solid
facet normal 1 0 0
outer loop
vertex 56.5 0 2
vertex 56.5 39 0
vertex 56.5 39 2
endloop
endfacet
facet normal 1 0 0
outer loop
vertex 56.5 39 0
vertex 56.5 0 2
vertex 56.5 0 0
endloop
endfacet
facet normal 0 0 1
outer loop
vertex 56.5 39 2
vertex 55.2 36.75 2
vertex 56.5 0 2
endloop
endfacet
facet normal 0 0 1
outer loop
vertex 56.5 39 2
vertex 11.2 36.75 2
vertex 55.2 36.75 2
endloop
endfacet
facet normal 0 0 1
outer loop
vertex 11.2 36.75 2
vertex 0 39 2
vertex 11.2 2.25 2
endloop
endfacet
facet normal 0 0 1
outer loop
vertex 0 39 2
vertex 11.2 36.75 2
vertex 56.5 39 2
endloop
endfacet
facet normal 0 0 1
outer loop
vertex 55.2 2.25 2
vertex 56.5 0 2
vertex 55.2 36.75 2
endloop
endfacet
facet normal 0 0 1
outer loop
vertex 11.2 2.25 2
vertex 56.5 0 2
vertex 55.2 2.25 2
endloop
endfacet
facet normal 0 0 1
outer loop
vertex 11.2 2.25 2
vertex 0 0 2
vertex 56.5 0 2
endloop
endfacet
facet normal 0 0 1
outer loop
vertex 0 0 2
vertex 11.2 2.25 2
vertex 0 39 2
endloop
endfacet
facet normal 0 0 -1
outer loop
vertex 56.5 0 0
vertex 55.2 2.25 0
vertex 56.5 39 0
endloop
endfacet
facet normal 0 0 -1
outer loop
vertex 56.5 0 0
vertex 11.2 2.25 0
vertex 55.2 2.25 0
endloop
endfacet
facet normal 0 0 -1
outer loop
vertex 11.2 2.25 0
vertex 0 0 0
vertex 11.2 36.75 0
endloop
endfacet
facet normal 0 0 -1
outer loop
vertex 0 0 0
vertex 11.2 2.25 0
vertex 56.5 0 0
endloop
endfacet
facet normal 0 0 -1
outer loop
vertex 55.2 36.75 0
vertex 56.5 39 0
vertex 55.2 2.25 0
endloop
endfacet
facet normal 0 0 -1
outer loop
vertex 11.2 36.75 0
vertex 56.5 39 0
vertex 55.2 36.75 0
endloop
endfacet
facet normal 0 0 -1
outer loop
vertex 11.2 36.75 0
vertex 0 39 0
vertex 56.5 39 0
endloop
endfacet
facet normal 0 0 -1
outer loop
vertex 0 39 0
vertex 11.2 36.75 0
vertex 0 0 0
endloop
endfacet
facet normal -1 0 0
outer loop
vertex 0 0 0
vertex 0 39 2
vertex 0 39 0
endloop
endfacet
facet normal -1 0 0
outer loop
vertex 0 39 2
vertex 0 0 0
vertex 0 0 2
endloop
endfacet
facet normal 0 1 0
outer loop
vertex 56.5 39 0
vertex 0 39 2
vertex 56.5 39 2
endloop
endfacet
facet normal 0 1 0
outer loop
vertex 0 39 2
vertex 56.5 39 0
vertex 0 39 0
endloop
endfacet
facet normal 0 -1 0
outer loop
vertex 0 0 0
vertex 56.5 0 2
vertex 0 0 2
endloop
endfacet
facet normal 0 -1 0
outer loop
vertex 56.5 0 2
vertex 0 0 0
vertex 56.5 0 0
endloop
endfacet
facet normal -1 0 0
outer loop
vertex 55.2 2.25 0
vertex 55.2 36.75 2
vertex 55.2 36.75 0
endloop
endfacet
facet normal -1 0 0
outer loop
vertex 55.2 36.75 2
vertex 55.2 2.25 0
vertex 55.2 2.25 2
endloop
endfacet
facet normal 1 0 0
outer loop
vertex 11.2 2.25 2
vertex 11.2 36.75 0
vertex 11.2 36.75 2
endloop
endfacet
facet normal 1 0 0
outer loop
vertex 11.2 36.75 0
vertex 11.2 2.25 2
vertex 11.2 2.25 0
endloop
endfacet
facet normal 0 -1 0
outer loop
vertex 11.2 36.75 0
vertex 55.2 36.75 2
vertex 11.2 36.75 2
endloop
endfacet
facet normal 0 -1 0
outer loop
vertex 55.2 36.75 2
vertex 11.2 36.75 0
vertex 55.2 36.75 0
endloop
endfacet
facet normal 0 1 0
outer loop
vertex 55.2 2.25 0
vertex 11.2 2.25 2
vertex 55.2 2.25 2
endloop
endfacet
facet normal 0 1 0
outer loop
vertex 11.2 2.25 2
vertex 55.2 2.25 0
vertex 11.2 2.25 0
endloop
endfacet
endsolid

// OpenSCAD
$fn = 128;

wall = 2;
wall_up = 1.5;

screenhole_width = 34.5;
screenhole_height = 44;
screen_board_len = 9;

width = (screenhole_width + 0.5) + (wall * 2);
height = (screenhole_height + screen_board_len) + wall + wall_up;
thickness = wall;

screenhole_offset = -0.2 + wall_up;

// -----------------------------------------------

difference() {
    cube([height, width, thickness]);
    
    translate([height - screenhole_height - screenhole_offset, (width / 2) - (screenhole_width / 2), -0.5])
        cube([screenhole_height, screenhole_width, thickness + 1]);
}
